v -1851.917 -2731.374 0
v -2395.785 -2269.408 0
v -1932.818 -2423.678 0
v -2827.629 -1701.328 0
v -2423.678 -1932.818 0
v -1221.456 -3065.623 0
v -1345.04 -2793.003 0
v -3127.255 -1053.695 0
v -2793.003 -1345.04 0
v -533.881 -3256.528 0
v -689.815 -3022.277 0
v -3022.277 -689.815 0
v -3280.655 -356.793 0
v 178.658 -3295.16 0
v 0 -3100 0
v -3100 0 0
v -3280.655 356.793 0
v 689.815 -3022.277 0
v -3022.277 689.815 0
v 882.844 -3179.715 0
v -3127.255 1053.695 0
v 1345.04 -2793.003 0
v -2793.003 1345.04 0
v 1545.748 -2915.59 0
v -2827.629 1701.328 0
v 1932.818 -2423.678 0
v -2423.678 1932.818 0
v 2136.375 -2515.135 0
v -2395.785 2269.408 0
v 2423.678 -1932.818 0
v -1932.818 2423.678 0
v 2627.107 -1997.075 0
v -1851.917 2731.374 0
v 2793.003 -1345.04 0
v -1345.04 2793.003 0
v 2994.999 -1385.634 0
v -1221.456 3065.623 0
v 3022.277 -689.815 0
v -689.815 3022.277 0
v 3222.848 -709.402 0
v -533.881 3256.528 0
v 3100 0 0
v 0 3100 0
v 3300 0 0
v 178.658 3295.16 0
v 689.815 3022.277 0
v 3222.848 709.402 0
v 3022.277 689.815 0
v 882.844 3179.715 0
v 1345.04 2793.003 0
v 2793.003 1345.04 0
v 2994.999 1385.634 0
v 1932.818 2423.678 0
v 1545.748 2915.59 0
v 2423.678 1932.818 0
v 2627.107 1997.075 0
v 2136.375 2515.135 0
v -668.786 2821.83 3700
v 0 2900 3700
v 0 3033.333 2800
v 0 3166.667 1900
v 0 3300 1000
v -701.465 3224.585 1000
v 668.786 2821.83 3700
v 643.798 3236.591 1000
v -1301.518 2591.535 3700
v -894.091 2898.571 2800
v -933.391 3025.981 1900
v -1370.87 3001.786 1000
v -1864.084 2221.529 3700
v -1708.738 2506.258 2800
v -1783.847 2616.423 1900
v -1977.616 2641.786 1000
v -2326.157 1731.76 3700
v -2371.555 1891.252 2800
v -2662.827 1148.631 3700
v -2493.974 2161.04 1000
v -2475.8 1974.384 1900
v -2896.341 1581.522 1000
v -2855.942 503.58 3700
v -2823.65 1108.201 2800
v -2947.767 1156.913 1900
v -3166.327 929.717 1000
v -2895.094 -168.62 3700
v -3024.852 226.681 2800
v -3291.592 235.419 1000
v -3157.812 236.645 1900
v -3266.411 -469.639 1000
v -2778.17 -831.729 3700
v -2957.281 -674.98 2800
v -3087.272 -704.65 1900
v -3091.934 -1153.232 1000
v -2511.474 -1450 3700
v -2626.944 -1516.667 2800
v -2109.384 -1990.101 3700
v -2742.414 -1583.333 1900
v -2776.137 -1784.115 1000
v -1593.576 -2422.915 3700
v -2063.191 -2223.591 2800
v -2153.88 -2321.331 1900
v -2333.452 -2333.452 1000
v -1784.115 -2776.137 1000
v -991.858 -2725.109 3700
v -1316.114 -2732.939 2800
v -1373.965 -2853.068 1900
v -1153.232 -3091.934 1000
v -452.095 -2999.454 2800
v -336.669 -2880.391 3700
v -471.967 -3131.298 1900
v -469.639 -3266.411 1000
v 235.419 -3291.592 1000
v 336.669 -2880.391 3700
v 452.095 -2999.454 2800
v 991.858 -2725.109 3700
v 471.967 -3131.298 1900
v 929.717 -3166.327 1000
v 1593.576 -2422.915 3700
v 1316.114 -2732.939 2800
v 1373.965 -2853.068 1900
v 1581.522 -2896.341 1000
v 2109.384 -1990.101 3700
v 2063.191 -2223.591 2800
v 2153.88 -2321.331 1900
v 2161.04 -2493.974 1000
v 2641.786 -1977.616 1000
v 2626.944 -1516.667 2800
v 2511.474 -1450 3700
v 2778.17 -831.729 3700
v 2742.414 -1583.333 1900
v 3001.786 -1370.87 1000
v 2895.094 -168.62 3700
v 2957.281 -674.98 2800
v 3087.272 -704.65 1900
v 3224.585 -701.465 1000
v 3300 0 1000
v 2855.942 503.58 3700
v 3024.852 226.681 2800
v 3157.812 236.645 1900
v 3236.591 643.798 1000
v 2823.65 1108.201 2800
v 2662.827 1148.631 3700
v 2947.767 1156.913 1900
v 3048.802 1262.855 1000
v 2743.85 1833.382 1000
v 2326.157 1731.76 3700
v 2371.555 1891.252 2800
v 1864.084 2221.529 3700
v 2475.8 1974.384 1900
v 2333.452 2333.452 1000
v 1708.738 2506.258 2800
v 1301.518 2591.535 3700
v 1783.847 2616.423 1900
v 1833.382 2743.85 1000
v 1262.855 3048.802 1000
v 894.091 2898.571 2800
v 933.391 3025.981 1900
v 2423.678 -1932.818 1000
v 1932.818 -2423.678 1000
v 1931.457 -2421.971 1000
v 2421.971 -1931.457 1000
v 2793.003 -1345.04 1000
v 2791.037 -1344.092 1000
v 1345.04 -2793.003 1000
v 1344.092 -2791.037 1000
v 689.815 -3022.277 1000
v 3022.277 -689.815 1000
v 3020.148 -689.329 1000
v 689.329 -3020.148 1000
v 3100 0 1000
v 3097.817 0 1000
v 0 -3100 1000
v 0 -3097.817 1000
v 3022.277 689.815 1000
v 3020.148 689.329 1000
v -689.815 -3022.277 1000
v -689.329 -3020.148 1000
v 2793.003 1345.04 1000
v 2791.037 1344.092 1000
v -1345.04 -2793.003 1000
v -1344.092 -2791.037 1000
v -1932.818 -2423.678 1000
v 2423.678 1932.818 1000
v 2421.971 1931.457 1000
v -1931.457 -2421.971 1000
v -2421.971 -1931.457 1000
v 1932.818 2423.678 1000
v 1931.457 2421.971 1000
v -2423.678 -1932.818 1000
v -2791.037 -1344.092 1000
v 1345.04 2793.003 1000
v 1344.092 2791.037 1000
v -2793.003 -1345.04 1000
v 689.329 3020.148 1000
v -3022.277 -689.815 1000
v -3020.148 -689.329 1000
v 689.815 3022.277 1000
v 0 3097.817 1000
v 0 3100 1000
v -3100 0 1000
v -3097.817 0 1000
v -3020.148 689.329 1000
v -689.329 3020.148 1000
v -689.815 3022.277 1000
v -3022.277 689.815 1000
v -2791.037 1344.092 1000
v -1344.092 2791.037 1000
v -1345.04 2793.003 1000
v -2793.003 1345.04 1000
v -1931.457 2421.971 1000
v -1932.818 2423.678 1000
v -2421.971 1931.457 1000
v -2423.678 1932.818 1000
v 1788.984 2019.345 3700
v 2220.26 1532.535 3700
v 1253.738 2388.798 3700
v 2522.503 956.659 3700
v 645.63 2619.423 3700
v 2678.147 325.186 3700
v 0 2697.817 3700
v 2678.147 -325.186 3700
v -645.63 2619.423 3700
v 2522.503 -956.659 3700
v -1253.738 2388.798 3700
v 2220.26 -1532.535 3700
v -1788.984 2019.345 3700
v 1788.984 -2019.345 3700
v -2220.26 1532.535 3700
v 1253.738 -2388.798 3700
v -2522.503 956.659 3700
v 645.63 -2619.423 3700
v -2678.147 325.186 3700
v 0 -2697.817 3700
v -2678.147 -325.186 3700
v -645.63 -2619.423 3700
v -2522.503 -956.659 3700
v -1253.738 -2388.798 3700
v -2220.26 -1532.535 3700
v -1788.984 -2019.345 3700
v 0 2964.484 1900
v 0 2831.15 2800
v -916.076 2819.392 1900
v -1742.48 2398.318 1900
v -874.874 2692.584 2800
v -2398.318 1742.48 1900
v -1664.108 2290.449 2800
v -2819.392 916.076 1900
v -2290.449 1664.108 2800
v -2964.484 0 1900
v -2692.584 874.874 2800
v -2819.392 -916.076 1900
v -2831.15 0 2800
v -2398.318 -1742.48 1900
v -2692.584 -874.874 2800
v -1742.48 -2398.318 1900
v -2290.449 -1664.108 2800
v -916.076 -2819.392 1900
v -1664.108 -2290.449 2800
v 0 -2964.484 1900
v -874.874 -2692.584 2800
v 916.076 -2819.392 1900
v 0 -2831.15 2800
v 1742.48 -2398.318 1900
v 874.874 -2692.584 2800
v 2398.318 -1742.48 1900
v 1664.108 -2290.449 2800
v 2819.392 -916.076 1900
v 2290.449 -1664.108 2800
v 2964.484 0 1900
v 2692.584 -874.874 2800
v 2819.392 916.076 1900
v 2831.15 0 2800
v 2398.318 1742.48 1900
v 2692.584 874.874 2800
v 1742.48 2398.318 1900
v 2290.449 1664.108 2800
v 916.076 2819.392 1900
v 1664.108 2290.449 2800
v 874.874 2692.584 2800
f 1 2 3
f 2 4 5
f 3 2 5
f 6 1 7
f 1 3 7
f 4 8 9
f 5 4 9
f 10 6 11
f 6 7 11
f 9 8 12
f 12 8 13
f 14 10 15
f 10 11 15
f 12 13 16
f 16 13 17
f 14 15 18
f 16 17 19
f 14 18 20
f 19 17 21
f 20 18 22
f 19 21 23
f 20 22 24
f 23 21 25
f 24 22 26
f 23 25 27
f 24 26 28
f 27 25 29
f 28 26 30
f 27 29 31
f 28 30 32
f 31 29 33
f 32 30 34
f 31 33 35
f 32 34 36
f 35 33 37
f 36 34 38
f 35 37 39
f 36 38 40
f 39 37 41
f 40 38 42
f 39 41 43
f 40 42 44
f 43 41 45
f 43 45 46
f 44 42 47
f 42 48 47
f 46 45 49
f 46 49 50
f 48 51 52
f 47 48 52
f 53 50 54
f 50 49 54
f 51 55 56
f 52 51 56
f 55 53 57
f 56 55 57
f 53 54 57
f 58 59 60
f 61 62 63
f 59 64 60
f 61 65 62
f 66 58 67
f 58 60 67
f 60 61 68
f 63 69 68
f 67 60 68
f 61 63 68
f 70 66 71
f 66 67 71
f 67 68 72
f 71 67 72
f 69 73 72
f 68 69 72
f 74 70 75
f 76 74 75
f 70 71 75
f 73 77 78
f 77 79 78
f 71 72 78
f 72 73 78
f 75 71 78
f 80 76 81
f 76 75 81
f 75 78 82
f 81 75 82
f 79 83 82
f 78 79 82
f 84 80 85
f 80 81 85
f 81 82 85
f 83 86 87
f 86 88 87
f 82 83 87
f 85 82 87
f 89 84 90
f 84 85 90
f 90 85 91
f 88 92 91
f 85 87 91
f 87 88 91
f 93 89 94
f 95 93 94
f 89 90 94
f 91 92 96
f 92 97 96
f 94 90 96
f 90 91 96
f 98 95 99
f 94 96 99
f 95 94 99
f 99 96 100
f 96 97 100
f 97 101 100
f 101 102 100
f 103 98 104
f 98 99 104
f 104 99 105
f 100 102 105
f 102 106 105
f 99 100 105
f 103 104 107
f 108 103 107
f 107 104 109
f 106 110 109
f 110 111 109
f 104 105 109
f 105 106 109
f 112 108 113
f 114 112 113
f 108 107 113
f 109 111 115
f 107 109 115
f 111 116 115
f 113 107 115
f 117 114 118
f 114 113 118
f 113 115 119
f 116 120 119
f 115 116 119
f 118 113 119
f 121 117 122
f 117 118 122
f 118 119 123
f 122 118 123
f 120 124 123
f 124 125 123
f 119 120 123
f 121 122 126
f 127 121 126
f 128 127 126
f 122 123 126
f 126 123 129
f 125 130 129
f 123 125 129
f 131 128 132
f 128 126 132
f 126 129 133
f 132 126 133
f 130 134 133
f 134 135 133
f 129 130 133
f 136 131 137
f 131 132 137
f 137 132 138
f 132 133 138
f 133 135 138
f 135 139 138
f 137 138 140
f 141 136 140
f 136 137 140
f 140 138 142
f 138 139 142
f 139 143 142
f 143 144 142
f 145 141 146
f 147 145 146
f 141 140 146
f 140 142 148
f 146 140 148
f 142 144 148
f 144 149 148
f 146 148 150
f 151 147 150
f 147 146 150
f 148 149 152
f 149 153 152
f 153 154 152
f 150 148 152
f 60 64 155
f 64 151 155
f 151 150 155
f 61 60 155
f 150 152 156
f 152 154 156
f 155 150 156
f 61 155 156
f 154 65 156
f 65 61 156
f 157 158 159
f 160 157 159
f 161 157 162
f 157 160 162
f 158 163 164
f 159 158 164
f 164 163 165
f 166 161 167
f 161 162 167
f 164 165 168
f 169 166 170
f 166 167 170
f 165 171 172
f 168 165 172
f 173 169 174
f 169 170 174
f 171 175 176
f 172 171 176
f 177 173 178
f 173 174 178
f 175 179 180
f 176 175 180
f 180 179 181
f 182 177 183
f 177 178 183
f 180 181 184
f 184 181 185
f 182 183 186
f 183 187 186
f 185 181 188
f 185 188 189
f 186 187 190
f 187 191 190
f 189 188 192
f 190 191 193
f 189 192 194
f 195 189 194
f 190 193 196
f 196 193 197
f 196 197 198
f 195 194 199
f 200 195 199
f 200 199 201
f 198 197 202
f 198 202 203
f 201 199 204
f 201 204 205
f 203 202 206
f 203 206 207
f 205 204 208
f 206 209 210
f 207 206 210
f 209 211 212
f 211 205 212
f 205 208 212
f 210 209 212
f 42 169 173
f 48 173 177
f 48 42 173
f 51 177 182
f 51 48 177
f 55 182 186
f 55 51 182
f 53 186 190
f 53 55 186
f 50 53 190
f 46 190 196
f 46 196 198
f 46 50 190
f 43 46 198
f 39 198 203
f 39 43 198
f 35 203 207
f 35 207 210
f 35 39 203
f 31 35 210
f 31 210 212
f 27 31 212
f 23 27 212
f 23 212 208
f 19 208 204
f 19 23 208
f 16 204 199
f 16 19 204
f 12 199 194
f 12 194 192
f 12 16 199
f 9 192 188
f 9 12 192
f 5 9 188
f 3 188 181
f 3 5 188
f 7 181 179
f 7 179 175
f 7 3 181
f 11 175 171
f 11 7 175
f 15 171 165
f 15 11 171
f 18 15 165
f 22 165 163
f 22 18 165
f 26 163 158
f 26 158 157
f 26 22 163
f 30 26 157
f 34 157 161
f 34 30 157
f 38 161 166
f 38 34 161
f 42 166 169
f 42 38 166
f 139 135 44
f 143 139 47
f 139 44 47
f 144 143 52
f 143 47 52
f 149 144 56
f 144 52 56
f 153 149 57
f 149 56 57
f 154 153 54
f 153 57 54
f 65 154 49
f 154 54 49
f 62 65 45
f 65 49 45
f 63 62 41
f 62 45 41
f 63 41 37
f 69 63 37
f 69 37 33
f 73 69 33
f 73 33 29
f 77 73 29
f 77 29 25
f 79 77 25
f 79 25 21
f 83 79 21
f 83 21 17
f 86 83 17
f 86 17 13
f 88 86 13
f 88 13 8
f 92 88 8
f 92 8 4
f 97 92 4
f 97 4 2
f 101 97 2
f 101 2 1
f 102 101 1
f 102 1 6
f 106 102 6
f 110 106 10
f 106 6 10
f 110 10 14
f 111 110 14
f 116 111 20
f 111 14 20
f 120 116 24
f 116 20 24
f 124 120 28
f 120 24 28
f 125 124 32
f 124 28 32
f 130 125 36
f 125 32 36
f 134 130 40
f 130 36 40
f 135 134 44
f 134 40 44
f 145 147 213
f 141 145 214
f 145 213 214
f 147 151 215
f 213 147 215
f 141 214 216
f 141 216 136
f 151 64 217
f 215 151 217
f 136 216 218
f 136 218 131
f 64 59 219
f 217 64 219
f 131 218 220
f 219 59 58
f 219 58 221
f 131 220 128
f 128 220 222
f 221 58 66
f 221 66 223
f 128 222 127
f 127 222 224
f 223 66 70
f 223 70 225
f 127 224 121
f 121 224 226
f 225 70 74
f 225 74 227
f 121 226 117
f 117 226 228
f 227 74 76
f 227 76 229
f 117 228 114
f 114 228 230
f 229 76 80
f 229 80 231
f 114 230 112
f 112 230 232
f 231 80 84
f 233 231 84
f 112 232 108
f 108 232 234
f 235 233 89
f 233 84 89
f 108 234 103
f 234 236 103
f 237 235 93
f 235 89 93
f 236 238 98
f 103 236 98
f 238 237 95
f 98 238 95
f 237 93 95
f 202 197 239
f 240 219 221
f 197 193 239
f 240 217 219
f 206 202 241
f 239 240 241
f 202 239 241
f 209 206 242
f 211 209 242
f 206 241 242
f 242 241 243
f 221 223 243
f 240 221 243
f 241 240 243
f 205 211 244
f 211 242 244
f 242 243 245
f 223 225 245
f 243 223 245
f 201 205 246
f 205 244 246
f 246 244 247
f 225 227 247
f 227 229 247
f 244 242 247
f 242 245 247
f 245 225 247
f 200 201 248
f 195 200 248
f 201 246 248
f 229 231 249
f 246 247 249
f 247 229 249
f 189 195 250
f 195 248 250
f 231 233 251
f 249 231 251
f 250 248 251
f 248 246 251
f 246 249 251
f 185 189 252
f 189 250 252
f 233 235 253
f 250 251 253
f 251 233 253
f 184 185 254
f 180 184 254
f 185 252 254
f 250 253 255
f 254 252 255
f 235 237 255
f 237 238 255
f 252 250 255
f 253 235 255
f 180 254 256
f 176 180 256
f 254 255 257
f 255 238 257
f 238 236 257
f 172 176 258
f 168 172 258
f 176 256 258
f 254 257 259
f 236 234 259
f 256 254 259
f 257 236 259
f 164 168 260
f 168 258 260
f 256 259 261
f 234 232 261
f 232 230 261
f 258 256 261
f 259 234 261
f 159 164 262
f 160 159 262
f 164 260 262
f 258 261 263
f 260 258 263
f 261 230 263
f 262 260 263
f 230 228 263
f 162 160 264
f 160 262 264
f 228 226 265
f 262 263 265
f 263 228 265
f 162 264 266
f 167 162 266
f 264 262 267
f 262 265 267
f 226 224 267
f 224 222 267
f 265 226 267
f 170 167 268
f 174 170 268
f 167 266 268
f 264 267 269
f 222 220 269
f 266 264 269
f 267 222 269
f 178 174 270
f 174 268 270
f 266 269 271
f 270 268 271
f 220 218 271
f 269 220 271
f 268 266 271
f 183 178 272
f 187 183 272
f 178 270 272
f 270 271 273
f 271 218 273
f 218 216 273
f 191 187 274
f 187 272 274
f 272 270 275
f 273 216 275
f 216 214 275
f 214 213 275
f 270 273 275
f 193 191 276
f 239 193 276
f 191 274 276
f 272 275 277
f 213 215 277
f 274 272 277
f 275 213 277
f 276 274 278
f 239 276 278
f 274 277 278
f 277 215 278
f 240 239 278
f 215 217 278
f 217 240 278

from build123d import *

# Parameters (mm, degrees)
SCHIZZO1_R                   = 3300
SCHIZZO1_R_2                 = 3100
ESTRUSIONE_ESTRUSIONE1_DEPTH = 1000


with BuildPart() as part:
    # Schizzo1 → Estrusione-Estrusione1 (new body)
    with BuildSketch(Plane.XY):
        Circle(SCHIZZO1_R)
        Circle(SCHIZZO1_R_2, mode=Mode.SUBTRACT)
    extrude(amount=ESTRUSIONE_ESTRUSIONE1_DEPTH)

    # Schizzo3 → Rivoluzione1 (revolve)
    with BuildSketch(Plane(origin=(0, 0, 0), x_dir=(0, 0, -1), z_dir=(1, 0, 0))):
        Polygon((-3700, 2697.817124978), (-3700, 2900), (-1000, 3300), (-1000, 3097.817124978), align=None)
    revolve(axis=Axis((0, 0, 1000), (0, 0, 1)))


solid = part.part
